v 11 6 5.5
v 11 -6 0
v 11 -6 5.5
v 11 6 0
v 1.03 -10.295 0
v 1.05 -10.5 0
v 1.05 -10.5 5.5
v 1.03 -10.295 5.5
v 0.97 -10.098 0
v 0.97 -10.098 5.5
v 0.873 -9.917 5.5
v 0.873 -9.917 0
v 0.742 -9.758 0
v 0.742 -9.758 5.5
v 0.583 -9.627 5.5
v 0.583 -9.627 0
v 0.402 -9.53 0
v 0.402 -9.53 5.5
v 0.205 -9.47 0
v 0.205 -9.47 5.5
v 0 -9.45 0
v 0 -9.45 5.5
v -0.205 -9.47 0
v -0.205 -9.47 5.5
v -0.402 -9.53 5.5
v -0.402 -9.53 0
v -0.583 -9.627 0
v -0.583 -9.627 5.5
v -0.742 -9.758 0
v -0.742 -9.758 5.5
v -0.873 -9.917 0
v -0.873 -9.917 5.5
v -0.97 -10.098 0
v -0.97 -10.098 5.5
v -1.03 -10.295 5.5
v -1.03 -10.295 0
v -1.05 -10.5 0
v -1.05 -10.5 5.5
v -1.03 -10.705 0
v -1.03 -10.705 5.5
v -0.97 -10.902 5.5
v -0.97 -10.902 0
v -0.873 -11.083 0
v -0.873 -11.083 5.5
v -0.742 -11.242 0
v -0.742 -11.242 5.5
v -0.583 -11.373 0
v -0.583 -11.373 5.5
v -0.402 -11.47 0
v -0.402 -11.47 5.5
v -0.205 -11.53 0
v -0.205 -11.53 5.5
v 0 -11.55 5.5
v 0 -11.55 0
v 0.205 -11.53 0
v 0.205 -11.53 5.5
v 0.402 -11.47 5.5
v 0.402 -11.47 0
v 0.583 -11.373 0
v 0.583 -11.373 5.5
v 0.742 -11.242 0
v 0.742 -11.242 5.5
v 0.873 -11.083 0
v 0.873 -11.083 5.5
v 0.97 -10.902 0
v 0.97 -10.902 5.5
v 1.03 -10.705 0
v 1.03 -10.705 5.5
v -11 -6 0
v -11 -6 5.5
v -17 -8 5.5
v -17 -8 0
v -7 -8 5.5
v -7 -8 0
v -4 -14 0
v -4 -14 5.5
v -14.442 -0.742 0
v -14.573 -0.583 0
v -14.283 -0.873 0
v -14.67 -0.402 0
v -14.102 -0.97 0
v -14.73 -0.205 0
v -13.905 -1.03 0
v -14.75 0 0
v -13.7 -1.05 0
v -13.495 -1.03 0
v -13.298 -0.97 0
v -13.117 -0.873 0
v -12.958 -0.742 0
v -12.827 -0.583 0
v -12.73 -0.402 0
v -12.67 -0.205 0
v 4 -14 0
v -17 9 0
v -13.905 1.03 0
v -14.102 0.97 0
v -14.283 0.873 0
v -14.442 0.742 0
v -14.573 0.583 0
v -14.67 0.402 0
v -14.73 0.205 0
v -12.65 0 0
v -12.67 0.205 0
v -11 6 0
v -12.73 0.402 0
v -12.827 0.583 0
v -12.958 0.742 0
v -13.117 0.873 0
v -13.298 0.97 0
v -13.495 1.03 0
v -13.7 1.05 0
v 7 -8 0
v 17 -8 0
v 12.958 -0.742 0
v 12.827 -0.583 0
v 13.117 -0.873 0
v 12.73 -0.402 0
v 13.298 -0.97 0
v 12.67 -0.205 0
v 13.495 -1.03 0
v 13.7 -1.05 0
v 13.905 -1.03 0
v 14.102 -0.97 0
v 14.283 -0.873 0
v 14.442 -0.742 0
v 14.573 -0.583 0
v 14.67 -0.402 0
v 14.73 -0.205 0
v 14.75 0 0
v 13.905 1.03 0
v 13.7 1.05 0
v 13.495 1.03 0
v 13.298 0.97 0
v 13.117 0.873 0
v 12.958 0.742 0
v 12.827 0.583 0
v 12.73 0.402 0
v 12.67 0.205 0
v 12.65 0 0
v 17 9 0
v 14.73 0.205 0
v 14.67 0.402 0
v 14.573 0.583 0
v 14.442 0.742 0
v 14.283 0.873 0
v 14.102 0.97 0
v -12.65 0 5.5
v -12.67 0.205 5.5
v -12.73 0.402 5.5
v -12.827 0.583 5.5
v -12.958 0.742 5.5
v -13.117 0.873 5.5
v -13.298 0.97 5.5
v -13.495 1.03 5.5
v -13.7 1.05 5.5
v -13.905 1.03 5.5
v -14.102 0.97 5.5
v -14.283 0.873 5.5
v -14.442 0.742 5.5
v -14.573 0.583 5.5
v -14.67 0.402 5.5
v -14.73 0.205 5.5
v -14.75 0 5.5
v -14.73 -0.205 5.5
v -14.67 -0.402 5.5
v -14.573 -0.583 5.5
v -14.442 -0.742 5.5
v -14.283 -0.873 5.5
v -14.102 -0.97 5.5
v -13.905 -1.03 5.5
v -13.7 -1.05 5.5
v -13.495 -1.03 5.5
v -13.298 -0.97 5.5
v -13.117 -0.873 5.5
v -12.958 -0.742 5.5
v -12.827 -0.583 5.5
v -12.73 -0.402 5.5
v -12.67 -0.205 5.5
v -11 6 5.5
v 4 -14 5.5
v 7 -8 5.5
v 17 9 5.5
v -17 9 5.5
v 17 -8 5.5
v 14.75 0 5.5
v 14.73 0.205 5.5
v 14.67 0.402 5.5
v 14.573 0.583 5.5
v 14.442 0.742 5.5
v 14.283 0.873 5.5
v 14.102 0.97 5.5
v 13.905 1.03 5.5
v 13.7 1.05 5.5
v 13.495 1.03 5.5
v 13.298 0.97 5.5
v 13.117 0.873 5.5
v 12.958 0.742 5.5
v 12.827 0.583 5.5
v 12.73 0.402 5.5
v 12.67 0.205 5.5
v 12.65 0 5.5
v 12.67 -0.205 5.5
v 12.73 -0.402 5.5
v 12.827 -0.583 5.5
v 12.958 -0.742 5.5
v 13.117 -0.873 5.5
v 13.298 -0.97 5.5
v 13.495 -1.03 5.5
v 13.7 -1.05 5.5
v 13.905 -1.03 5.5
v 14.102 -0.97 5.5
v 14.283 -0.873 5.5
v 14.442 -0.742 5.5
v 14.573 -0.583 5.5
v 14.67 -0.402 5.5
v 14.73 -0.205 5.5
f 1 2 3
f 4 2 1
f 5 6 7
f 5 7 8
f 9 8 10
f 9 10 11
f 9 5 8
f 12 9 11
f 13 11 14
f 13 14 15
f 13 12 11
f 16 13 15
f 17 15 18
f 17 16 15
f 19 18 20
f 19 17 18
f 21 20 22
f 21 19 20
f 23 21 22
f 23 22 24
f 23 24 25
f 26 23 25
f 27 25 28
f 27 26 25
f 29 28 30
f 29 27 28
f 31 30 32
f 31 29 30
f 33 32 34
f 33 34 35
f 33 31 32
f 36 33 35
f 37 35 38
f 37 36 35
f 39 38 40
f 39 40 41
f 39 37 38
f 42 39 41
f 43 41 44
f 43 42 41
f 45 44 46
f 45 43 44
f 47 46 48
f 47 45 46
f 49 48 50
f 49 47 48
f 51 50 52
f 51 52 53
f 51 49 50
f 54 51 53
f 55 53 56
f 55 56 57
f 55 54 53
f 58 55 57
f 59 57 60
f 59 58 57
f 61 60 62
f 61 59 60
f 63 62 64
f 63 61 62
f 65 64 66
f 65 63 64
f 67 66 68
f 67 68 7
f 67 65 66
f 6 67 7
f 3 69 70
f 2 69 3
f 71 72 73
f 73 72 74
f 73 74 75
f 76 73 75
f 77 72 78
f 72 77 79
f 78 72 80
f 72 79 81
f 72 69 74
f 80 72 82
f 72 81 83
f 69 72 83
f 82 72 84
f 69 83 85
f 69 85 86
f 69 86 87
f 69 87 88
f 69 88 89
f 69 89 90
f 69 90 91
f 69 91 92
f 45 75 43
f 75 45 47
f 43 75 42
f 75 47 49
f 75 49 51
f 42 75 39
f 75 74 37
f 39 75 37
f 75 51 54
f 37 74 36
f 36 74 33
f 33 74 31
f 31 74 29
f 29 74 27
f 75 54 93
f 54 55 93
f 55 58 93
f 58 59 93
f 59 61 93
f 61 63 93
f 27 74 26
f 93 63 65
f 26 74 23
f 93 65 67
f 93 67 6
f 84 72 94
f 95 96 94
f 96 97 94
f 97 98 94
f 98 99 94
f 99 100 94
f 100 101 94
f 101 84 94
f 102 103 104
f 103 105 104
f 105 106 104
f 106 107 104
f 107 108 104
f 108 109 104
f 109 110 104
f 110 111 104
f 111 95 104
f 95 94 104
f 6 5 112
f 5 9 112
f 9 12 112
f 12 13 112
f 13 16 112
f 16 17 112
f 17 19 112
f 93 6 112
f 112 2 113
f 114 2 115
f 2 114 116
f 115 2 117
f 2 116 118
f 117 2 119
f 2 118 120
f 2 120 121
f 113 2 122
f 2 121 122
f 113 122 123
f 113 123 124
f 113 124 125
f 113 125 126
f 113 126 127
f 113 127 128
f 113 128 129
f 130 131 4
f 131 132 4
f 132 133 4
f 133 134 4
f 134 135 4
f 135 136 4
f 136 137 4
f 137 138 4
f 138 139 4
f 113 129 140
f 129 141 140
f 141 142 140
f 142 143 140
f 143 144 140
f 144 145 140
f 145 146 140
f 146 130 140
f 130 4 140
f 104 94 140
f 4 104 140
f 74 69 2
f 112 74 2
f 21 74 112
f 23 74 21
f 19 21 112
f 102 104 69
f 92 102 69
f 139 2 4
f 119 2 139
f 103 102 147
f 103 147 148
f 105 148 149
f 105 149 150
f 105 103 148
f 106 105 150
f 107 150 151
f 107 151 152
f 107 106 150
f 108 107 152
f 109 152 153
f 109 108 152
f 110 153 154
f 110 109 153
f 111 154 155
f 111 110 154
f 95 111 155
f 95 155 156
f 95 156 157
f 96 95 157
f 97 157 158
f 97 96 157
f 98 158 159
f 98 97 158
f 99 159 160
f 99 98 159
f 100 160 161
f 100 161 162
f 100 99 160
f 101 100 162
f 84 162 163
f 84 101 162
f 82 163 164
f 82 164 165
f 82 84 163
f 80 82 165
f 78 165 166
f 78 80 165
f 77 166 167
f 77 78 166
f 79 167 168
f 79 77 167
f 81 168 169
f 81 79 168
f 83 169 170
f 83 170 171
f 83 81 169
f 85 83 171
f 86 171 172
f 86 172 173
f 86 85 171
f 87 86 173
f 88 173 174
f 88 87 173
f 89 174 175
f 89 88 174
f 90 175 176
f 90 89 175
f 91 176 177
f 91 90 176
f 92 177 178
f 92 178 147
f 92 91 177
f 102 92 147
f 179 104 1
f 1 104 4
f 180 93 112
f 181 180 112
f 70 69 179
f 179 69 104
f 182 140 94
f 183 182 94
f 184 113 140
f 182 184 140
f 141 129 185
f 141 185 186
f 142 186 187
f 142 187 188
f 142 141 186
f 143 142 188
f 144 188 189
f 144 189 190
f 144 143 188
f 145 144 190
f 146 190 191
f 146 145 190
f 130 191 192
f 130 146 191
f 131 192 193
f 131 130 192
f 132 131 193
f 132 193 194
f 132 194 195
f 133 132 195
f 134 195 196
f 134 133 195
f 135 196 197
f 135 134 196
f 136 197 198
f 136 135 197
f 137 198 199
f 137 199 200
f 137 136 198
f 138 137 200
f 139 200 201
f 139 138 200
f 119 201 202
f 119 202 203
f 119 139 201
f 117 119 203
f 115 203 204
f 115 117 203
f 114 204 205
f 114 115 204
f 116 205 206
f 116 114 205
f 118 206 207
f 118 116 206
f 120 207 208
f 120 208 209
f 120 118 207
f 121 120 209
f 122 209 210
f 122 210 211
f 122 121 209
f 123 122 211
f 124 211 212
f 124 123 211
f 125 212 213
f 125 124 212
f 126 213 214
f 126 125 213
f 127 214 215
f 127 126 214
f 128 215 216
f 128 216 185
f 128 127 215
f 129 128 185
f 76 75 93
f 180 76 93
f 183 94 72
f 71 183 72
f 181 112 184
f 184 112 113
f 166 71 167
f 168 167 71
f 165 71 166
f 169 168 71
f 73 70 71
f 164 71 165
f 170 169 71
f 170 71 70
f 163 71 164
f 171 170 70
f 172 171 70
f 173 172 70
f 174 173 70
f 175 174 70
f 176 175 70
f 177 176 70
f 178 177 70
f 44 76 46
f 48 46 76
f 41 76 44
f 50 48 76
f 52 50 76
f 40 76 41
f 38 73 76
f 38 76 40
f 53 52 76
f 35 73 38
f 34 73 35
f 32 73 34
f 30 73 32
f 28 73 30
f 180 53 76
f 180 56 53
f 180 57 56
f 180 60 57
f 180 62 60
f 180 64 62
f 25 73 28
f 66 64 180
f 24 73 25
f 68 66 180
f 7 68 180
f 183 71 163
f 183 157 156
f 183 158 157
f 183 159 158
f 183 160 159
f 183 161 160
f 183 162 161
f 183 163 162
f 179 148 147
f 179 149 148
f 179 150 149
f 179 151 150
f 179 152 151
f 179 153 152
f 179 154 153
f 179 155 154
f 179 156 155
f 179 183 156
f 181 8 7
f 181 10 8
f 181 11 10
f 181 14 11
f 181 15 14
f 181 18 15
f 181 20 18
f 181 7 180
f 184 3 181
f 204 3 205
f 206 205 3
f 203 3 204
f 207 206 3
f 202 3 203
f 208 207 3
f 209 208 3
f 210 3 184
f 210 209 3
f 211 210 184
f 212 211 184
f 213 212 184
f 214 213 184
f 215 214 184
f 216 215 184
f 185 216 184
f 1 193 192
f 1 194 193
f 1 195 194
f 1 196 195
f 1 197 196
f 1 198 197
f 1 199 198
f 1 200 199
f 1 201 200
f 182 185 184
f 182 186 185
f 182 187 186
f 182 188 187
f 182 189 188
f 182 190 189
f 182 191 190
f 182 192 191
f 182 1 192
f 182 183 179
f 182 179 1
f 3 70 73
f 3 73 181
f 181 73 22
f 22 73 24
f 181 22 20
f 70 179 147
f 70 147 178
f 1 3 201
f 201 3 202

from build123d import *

# Parameters (mm, degrees)
SKETCH_1_R      = 1.05
SKETCH_1_W      = 22
SKETCH_1_H      = 12
EXTRUDE_1_DEPTH = 5.5


with BuildPart() as part:
    # ｽｹｯﾁ1 → ﾎﾞｽ - 押し出し1 (new body)
    with BuildSketch(Plane.XY):
        Polygon((-17, -8), (-7, -8), (-4, -14), (4, -14), (7, -8), (17, -8), (17, 9), (-17, 9), align=None)
        with Locations((-13.7, 0)):
            Circle(SKETCH_1_R, mode=Mode.SUBTRACT)
        with Locations((13.7, 0)):
            Circle(SKETCH_1_R, mode=Mode.SUBTRACT)
        with Locations((0, -10.5)):
            Circle(SKETCH_1_R, mode=Mode.SUBTRACT)
        Rectangle(SKETCH_1_W, SKETCH_1_H, mode=Mode.SUBTRACT)
    extrude(amount=EXTRUDE_1_DEPTH)


solid = part.part
